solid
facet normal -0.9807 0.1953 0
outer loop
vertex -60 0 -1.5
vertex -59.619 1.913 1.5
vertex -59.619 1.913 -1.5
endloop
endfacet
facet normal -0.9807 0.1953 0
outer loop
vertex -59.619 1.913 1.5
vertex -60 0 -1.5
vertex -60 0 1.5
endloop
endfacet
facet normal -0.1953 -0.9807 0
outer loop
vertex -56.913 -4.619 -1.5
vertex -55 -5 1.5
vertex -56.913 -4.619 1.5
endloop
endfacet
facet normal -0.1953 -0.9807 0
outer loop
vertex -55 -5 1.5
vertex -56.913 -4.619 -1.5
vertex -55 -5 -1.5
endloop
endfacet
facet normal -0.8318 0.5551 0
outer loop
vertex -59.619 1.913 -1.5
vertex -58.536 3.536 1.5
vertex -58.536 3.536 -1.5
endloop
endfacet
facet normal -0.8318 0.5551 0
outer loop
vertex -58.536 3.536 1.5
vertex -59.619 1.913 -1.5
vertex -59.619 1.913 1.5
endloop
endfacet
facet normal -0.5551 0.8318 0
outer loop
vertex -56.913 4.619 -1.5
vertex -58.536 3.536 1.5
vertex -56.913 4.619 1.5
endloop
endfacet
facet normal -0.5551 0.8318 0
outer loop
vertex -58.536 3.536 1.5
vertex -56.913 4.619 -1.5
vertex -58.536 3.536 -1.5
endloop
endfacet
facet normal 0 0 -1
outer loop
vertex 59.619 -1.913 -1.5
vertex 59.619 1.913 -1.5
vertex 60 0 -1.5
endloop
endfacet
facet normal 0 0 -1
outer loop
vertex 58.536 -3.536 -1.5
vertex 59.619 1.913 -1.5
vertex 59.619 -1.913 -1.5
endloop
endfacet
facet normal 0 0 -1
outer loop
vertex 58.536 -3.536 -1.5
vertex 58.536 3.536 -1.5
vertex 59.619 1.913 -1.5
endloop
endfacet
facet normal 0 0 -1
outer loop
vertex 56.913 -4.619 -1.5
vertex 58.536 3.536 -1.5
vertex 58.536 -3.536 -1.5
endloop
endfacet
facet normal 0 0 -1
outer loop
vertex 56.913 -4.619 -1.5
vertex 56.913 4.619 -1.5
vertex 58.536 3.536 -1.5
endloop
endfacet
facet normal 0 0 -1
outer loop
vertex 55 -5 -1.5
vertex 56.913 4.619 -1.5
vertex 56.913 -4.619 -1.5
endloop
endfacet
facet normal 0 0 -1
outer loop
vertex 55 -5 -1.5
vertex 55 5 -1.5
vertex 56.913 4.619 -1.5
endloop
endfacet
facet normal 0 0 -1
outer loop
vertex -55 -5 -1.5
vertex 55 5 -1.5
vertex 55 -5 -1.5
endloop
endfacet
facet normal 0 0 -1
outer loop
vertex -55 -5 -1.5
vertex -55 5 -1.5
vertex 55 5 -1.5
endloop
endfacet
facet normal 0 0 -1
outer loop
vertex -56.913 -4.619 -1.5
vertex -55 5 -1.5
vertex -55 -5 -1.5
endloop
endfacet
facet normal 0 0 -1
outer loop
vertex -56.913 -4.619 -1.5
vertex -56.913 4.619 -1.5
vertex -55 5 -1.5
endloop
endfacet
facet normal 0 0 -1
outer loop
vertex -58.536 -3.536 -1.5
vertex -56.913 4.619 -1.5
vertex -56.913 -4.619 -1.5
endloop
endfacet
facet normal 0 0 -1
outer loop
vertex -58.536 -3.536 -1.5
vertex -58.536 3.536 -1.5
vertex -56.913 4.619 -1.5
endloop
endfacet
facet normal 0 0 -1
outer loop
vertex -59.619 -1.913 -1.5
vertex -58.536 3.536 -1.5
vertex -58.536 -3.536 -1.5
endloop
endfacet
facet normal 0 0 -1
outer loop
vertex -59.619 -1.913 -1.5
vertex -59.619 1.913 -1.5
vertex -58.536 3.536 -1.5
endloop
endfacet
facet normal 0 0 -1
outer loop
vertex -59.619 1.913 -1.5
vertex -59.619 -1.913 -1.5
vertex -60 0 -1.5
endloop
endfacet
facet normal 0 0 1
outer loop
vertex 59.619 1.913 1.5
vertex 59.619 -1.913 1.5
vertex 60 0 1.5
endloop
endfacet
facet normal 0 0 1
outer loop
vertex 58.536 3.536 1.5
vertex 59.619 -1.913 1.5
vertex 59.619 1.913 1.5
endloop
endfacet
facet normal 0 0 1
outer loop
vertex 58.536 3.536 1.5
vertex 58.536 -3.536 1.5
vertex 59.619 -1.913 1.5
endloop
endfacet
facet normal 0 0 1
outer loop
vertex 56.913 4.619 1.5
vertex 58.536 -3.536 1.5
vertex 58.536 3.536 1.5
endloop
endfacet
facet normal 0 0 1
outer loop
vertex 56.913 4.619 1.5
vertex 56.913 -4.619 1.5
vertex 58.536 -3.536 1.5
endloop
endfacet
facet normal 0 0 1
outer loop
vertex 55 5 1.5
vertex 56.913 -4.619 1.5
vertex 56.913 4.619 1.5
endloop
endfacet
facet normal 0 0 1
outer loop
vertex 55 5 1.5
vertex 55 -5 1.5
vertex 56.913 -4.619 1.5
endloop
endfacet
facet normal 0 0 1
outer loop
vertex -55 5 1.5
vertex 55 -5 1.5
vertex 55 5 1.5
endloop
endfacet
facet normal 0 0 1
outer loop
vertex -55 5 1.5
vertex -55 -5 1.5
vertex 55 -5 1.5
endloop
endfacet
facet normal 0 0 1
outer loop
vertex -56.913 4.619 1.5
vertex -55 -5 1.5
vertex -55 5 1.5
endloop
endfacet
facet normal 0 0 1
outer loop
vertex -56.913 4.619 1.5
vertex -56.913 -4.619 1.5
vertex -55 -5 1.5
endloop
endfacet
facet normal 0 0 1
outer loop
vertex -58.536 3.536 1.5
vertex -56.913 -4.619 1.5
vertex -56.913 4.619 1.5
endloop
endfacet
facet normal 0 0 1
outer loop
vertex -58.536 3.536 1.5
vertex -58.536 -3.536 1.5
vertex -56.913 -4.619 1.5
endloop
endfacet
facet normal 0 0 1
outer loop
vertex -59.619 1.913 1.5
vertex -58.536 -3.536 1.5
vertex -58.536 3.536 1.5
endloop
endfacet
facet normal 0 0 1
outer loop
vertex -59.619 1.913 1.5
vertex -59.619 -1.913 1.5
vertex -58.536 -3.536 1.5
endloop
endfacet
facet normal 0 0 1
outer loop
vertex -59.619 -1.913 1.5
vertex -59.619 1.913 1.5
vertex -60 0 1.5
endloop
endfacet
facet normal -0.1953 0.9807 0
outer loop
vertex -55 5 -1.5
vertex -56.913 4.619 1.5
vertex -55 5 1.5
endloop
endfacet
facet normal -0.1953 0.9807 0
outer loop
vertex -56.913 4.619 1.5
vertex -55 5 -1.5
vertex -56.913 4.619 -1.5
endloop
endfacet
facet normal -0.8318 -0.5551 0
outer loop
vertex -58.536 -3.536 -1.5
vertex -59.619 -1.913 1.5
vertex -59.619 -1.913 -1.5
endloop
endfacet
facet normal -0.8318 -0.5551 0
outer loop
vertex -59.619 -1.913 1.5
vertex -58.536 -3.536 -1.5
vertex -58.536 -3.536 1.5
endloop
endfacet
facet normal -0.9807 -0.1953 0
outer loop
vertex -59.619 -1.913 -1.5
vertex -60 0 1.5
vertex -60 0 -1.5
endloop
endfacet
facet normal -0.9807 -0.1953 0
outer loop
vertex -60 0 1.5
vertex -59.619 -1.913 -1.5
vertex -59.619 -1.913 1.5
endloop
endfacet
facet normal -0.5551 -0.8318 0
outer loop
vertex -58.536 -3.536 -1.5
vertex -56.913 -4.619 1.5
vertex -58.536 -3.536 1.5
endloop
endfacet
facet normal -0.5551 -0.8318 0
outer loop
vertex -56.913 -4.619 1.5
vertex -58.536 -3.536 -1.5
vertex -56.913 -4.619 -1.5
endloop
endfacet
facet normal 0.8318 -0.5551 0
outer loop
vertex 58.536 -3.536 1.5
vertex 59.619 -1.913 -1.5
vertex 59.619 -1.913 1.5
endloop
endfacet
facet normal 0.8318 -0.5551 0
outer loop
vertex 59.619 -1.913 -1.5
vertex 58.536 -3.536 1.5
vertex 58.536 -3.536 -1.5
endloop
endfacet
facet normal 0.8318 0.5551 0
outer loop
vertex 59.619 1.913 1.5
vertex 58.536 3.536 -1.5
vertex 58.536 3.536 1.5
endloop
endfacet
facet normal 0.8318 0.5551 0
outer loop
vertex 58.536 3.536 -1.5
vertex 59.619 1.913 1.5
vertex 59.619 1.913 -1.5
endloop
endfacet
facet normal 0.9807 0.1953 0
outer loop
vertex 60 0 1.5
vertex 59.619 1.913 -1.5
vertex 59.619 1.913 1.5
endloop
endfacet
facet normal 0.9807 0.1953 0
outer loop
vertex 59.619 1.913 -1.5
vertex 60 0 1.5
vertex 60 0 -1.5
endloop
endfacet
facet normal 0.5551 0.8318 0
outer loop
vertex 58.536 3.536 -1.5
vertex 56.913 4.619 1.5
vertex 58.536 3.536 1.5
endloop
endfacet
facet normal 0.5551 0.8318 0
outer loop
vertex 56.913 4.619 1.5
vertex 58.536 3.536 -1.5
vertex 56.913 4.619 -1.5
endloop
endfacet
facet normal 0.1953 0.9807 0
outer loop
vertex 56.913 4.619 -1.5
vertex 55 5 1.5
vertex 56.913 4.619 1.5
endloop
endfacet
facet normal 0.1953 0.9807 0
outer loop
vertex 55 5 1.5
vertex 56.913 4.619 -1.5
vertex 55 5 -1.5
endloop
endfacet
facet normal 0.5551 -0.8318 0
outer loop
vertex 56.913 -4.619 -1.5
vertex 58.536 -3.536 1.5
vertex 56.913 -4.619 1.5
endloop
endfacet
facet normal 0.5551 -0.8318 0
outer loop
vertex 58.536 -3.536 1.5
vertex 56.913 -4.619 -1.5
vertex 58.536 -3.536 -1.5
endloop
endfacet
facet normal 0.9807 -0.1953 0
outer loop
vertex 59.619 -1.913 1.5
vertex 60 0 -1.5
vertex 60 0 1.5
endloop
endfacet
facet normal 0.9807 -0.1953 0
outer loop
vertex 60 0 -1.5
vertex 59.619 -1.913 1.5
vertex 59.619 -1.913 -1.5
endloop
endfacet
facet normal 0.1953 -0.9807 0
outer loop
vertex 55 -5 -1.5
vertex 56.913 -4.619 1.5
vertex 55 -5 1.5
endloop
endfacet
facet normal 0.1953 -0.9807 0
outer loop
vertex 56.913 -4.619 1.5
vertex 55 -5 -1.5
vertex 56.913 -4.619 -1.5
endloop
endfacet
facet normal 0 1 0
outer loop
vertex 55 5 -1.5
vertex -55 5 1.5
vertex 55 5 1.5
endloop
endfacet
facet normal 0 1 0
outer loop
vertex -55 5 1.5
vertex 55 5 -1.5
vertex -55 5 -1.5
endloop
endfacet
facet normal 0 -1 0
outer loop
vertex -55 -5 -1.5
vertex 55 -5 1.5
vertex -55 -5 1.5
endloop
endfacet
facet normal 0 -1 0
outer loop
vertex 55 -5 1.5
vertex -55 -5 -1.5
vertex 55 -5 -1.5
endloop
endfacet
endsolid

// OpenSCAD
// Overal dimensions
w    = 120;   // Width
h    = 180;   // Height
d    = 3;     // Depth

// Bracket is the part that drops down and clips into the base
bw   = w*0.5; // Bracket width
bh   = h*0.5; // Bracket height

// Tablet
lip  = 10;    // Overlapping lip that holds the tablet in place
td   = 6;     // Tablet depth

// Other
wd   = 2;     // Wire diameter e.g. a wire coathanger
gap  = 1.2;   // gap between things that move

// Item to print
// 0 - Demo
// 1 - Base
// 2 - Stand
// 3 - Holder
item = 3; 

use <MCAD/boxes.scad>;

module holder() {

    // This is the holder that clips onto the stand

    difference() {

        // Things that exist
        union() {
            roundedBox( [w, lip, d], 5, true );
        }

        // Things that don't exist
        union() {

        }
    
    }

}

module bracket() {

    // This is central part of the stand, 
    // that drops down to brace against the base

    union() {

        // Bracket
        translate( v = [0, d, d/2] ) {
            roundedBox( [bw -gap*2, bh -d*2 - gap*2, d], 5, true );
        }

        // Bracket hinge top half
        translate( v = [0, -bh/2 + d, d] ) {
            rotate( a = [0, 90, 0] ) {
                cylinder( h = bw/2 - gap*2, r = d, $fn = 100, center = true);
            }
        }

        // Bracket hinge bottom half
        translate( v = [-bw/4 + gap, -bh/2 +d, 0] ) {
            cube( [ bw/2 - gap*2, d*2, d ] );
        }

    }

}

module stand() {

    union() {

        difference() {

            // Things that exist
            union() {

                // Bracket hinge top half
                translate( v = [0, -bh/2 + d, d] ) {
                    rotate( a = [0, 90, 0] ) {
                        cylinder( h = bw, r = d, $fn = 100, center = true);
                    }
                }

                // Bracket hinge bottom half
                translate( v = [-bw/2, -bh/2, 0] ) {
                    cube( [ bw, d*2, d ] );
                }


            }

            // Things to cut away
            union() {

                // Cutaway centre of bracket hinge
                translate( v = [-bw/4, -bh/2, 0] ) {
                    cube( [ bw/2, d*2, d*2 ] );
                }

                // Bracket Hinge Wire (deliberate duplicate)
                translate( v = [0, -bh/2+d, d] ) {
                    rotate( a = [0, 90, 0] ) {
                        # cylinder( h = w - (w-bw)/2, r = wd/2, $fn = 100, center = true);
                    }
                }

                
            }

        }

    }

    difference() {

        // Things that exist
        union() {

            // Base
            translate( v = [0, 0, d/2] ) roundedBox( [w, h, d], 5, true );

            // Central portion of hinge
            translate( v = [0, -h/2+d, d] ) {
                rotate( a = [0, 90, 0] ) {
                    cylinder( h = w/2, r = d, $fn = 100, center = true);
                }
            }


        }

        // Things to be cut out
        union() {

            // Bracket
            translate( v = [0, 0, d/2] ) {
                # roundedBox( [bw, bh, d], 5, true );
            }

            // Main Hinge Wire
            translate( v = [0, -h/2 + d, d] ) {
                rotate( a = [0, 90, 0] ) {
                    # cylinder( h = w, r = wd/2, $fn = 100, center = true);
                }
            }

            // Bracket Hinge Wire (deliberate duplicate)
            translate( v = [0, -bh/2+d, d] ) {
                rotate( a = [0, 90, 0] ) {
                    # cylinder( h = w - (w-bw)/2, r = wd/2, $fn = 100, center = true);
                }
            }

            // Remove side portions of hinge
            for (x = [-w/2-5, w/4] ) {
                translate( v = [x, -h/2-d, d*2] ) {
                    rotate( a = [0, 90, 0] ) {
                        cube( [d*3, d*3, w/4+5] );
                    }
                }
            }

            // Extra gap to help bracket hinge work smoothly
            translate( v = [-bw/4, -bh/2-gap, 0] ) {
                cube( [ bw/2, gap*2, d*2 ] );
            }


        }

    }

}

module base() {

    difference() {

        // Things that exist
        union() {
            // Base
            translate( v = [0, 0, d/2] ) roundedBox( [w, h, d], 5, true );

            // Hinge
            translate( v = [0, -h/2 + d, d] ) {
                rotate( a = [0, 90, 0] ) {
                    cylinder( h = w, r = d, $fn = 100, center = true);
                }
            }
        }

        // Things to be cut out
        union() {
            // Slots
            for ( y = [0 : h/2/5 : h/2 - h/2/5] ) {
                translate( v = [0, y, d/2] ) roundedBox( [w/2, h/2/10, d], 2, true );
            }

            // Base Wire
            translate( v = [0, -h/2 + d, d] ) {
                rotate( a = [0, 90, 0] ) {
                    # cylinder( h = w, r = wd/2, $fn = 100, center = true);
                }
            }

            // Remove central portion of hinge
            translate( v = [-w/4, -h/2-d, d*2] ) {
                rotate( a = [0, 90, 0] ) {
                    cube( [d*3, d*3, w/2] );
                }
            }

        }
    }

}


// Demo
if (item == 0) {

    translate( v = [0, 0, -d] ) {
        base();
    }

    translate( v = [0, -27, 63] ) {
        rotate( a = [-45, 180, 0] ) {
            stand();
        }
    }

    translate( v = [0, -15, 17] ) {
        rotate( a = [25, 180, 0] ) {
            bracket();
        }
    }

}

if (item == 1) {
    base();
}

if (item == 2) {
    stand();
    bracket();
}

if (item == 3) {
    holder();
}

// http://en.wikibooks.org/wiki/OpenSCAD_User_Manual

// primitives
// cube(size = [1,2,3], center = true);
// sphere( r = 10, $fn=100 );
// circle( r = 10 );
// cylinder( h = 10, r = 20, $fs = 6, center = true );
// cylinder( h = 10, r1 = 10, r2 = 20, $fs = 6, center = false );
// polyhedron(points = [ [x, y, z], ... ], triangles = [ [p1, p2, p3..], ... ], convexity = N);
// polygon(points = [ [x, y], ... ], paths = [ [p1, p2, p3..], ... ], convexity = N);

// transormations
// scale(v = [x, y, z]) { ... }
// rotate(a=[0,180,0]) { ... }
// translate(v = [x, y, z]) { ... }
// mirror([ 0, 1, 0 ]) { ... }

// rounded box by combining a cube and single cylinder
// $fn=50;
// minkowski() {
//   cube([10,10,1]);
//   cylinder(r=2,h=1);
// }

// hull() {
//   translate([15,10,0]) circle(10);
//   circle(10);
// }

// dxf_linear_extrude(file="tridentlogo.dxf", height = 1, center = false, convexity = 10);
// deprecated - import_dxf(file="design.dxf", layer="layername", origin = [100,100], scale = 0.5);
// linear_extrude(height = 10, center = true, convexity = 10, twist = 0, $fn = 100)
// rotate_extrude(convexity = 10, $fn = 100)
// import_stl("example012.stl", convexity = 5);

// for (z = [-1, 1] ) { ... } // two iterations, z = -1, z = 1
// for (z = [ 0 : 5 ] ) { ... } // range of interations step 1
// for (z = [ 0 : 2 : 5 ] ) { ... } // range of interations step 2

// for (i = [ [ 0, 0, 0 ], [...] ] ) { ... } // range of rotations or vectors
// usage say rotate($i) or translate($i)
// if ( x > y ) { ... } else { ... }
// assign (angle = i*360/20, distance = i*10, r = i*2)
